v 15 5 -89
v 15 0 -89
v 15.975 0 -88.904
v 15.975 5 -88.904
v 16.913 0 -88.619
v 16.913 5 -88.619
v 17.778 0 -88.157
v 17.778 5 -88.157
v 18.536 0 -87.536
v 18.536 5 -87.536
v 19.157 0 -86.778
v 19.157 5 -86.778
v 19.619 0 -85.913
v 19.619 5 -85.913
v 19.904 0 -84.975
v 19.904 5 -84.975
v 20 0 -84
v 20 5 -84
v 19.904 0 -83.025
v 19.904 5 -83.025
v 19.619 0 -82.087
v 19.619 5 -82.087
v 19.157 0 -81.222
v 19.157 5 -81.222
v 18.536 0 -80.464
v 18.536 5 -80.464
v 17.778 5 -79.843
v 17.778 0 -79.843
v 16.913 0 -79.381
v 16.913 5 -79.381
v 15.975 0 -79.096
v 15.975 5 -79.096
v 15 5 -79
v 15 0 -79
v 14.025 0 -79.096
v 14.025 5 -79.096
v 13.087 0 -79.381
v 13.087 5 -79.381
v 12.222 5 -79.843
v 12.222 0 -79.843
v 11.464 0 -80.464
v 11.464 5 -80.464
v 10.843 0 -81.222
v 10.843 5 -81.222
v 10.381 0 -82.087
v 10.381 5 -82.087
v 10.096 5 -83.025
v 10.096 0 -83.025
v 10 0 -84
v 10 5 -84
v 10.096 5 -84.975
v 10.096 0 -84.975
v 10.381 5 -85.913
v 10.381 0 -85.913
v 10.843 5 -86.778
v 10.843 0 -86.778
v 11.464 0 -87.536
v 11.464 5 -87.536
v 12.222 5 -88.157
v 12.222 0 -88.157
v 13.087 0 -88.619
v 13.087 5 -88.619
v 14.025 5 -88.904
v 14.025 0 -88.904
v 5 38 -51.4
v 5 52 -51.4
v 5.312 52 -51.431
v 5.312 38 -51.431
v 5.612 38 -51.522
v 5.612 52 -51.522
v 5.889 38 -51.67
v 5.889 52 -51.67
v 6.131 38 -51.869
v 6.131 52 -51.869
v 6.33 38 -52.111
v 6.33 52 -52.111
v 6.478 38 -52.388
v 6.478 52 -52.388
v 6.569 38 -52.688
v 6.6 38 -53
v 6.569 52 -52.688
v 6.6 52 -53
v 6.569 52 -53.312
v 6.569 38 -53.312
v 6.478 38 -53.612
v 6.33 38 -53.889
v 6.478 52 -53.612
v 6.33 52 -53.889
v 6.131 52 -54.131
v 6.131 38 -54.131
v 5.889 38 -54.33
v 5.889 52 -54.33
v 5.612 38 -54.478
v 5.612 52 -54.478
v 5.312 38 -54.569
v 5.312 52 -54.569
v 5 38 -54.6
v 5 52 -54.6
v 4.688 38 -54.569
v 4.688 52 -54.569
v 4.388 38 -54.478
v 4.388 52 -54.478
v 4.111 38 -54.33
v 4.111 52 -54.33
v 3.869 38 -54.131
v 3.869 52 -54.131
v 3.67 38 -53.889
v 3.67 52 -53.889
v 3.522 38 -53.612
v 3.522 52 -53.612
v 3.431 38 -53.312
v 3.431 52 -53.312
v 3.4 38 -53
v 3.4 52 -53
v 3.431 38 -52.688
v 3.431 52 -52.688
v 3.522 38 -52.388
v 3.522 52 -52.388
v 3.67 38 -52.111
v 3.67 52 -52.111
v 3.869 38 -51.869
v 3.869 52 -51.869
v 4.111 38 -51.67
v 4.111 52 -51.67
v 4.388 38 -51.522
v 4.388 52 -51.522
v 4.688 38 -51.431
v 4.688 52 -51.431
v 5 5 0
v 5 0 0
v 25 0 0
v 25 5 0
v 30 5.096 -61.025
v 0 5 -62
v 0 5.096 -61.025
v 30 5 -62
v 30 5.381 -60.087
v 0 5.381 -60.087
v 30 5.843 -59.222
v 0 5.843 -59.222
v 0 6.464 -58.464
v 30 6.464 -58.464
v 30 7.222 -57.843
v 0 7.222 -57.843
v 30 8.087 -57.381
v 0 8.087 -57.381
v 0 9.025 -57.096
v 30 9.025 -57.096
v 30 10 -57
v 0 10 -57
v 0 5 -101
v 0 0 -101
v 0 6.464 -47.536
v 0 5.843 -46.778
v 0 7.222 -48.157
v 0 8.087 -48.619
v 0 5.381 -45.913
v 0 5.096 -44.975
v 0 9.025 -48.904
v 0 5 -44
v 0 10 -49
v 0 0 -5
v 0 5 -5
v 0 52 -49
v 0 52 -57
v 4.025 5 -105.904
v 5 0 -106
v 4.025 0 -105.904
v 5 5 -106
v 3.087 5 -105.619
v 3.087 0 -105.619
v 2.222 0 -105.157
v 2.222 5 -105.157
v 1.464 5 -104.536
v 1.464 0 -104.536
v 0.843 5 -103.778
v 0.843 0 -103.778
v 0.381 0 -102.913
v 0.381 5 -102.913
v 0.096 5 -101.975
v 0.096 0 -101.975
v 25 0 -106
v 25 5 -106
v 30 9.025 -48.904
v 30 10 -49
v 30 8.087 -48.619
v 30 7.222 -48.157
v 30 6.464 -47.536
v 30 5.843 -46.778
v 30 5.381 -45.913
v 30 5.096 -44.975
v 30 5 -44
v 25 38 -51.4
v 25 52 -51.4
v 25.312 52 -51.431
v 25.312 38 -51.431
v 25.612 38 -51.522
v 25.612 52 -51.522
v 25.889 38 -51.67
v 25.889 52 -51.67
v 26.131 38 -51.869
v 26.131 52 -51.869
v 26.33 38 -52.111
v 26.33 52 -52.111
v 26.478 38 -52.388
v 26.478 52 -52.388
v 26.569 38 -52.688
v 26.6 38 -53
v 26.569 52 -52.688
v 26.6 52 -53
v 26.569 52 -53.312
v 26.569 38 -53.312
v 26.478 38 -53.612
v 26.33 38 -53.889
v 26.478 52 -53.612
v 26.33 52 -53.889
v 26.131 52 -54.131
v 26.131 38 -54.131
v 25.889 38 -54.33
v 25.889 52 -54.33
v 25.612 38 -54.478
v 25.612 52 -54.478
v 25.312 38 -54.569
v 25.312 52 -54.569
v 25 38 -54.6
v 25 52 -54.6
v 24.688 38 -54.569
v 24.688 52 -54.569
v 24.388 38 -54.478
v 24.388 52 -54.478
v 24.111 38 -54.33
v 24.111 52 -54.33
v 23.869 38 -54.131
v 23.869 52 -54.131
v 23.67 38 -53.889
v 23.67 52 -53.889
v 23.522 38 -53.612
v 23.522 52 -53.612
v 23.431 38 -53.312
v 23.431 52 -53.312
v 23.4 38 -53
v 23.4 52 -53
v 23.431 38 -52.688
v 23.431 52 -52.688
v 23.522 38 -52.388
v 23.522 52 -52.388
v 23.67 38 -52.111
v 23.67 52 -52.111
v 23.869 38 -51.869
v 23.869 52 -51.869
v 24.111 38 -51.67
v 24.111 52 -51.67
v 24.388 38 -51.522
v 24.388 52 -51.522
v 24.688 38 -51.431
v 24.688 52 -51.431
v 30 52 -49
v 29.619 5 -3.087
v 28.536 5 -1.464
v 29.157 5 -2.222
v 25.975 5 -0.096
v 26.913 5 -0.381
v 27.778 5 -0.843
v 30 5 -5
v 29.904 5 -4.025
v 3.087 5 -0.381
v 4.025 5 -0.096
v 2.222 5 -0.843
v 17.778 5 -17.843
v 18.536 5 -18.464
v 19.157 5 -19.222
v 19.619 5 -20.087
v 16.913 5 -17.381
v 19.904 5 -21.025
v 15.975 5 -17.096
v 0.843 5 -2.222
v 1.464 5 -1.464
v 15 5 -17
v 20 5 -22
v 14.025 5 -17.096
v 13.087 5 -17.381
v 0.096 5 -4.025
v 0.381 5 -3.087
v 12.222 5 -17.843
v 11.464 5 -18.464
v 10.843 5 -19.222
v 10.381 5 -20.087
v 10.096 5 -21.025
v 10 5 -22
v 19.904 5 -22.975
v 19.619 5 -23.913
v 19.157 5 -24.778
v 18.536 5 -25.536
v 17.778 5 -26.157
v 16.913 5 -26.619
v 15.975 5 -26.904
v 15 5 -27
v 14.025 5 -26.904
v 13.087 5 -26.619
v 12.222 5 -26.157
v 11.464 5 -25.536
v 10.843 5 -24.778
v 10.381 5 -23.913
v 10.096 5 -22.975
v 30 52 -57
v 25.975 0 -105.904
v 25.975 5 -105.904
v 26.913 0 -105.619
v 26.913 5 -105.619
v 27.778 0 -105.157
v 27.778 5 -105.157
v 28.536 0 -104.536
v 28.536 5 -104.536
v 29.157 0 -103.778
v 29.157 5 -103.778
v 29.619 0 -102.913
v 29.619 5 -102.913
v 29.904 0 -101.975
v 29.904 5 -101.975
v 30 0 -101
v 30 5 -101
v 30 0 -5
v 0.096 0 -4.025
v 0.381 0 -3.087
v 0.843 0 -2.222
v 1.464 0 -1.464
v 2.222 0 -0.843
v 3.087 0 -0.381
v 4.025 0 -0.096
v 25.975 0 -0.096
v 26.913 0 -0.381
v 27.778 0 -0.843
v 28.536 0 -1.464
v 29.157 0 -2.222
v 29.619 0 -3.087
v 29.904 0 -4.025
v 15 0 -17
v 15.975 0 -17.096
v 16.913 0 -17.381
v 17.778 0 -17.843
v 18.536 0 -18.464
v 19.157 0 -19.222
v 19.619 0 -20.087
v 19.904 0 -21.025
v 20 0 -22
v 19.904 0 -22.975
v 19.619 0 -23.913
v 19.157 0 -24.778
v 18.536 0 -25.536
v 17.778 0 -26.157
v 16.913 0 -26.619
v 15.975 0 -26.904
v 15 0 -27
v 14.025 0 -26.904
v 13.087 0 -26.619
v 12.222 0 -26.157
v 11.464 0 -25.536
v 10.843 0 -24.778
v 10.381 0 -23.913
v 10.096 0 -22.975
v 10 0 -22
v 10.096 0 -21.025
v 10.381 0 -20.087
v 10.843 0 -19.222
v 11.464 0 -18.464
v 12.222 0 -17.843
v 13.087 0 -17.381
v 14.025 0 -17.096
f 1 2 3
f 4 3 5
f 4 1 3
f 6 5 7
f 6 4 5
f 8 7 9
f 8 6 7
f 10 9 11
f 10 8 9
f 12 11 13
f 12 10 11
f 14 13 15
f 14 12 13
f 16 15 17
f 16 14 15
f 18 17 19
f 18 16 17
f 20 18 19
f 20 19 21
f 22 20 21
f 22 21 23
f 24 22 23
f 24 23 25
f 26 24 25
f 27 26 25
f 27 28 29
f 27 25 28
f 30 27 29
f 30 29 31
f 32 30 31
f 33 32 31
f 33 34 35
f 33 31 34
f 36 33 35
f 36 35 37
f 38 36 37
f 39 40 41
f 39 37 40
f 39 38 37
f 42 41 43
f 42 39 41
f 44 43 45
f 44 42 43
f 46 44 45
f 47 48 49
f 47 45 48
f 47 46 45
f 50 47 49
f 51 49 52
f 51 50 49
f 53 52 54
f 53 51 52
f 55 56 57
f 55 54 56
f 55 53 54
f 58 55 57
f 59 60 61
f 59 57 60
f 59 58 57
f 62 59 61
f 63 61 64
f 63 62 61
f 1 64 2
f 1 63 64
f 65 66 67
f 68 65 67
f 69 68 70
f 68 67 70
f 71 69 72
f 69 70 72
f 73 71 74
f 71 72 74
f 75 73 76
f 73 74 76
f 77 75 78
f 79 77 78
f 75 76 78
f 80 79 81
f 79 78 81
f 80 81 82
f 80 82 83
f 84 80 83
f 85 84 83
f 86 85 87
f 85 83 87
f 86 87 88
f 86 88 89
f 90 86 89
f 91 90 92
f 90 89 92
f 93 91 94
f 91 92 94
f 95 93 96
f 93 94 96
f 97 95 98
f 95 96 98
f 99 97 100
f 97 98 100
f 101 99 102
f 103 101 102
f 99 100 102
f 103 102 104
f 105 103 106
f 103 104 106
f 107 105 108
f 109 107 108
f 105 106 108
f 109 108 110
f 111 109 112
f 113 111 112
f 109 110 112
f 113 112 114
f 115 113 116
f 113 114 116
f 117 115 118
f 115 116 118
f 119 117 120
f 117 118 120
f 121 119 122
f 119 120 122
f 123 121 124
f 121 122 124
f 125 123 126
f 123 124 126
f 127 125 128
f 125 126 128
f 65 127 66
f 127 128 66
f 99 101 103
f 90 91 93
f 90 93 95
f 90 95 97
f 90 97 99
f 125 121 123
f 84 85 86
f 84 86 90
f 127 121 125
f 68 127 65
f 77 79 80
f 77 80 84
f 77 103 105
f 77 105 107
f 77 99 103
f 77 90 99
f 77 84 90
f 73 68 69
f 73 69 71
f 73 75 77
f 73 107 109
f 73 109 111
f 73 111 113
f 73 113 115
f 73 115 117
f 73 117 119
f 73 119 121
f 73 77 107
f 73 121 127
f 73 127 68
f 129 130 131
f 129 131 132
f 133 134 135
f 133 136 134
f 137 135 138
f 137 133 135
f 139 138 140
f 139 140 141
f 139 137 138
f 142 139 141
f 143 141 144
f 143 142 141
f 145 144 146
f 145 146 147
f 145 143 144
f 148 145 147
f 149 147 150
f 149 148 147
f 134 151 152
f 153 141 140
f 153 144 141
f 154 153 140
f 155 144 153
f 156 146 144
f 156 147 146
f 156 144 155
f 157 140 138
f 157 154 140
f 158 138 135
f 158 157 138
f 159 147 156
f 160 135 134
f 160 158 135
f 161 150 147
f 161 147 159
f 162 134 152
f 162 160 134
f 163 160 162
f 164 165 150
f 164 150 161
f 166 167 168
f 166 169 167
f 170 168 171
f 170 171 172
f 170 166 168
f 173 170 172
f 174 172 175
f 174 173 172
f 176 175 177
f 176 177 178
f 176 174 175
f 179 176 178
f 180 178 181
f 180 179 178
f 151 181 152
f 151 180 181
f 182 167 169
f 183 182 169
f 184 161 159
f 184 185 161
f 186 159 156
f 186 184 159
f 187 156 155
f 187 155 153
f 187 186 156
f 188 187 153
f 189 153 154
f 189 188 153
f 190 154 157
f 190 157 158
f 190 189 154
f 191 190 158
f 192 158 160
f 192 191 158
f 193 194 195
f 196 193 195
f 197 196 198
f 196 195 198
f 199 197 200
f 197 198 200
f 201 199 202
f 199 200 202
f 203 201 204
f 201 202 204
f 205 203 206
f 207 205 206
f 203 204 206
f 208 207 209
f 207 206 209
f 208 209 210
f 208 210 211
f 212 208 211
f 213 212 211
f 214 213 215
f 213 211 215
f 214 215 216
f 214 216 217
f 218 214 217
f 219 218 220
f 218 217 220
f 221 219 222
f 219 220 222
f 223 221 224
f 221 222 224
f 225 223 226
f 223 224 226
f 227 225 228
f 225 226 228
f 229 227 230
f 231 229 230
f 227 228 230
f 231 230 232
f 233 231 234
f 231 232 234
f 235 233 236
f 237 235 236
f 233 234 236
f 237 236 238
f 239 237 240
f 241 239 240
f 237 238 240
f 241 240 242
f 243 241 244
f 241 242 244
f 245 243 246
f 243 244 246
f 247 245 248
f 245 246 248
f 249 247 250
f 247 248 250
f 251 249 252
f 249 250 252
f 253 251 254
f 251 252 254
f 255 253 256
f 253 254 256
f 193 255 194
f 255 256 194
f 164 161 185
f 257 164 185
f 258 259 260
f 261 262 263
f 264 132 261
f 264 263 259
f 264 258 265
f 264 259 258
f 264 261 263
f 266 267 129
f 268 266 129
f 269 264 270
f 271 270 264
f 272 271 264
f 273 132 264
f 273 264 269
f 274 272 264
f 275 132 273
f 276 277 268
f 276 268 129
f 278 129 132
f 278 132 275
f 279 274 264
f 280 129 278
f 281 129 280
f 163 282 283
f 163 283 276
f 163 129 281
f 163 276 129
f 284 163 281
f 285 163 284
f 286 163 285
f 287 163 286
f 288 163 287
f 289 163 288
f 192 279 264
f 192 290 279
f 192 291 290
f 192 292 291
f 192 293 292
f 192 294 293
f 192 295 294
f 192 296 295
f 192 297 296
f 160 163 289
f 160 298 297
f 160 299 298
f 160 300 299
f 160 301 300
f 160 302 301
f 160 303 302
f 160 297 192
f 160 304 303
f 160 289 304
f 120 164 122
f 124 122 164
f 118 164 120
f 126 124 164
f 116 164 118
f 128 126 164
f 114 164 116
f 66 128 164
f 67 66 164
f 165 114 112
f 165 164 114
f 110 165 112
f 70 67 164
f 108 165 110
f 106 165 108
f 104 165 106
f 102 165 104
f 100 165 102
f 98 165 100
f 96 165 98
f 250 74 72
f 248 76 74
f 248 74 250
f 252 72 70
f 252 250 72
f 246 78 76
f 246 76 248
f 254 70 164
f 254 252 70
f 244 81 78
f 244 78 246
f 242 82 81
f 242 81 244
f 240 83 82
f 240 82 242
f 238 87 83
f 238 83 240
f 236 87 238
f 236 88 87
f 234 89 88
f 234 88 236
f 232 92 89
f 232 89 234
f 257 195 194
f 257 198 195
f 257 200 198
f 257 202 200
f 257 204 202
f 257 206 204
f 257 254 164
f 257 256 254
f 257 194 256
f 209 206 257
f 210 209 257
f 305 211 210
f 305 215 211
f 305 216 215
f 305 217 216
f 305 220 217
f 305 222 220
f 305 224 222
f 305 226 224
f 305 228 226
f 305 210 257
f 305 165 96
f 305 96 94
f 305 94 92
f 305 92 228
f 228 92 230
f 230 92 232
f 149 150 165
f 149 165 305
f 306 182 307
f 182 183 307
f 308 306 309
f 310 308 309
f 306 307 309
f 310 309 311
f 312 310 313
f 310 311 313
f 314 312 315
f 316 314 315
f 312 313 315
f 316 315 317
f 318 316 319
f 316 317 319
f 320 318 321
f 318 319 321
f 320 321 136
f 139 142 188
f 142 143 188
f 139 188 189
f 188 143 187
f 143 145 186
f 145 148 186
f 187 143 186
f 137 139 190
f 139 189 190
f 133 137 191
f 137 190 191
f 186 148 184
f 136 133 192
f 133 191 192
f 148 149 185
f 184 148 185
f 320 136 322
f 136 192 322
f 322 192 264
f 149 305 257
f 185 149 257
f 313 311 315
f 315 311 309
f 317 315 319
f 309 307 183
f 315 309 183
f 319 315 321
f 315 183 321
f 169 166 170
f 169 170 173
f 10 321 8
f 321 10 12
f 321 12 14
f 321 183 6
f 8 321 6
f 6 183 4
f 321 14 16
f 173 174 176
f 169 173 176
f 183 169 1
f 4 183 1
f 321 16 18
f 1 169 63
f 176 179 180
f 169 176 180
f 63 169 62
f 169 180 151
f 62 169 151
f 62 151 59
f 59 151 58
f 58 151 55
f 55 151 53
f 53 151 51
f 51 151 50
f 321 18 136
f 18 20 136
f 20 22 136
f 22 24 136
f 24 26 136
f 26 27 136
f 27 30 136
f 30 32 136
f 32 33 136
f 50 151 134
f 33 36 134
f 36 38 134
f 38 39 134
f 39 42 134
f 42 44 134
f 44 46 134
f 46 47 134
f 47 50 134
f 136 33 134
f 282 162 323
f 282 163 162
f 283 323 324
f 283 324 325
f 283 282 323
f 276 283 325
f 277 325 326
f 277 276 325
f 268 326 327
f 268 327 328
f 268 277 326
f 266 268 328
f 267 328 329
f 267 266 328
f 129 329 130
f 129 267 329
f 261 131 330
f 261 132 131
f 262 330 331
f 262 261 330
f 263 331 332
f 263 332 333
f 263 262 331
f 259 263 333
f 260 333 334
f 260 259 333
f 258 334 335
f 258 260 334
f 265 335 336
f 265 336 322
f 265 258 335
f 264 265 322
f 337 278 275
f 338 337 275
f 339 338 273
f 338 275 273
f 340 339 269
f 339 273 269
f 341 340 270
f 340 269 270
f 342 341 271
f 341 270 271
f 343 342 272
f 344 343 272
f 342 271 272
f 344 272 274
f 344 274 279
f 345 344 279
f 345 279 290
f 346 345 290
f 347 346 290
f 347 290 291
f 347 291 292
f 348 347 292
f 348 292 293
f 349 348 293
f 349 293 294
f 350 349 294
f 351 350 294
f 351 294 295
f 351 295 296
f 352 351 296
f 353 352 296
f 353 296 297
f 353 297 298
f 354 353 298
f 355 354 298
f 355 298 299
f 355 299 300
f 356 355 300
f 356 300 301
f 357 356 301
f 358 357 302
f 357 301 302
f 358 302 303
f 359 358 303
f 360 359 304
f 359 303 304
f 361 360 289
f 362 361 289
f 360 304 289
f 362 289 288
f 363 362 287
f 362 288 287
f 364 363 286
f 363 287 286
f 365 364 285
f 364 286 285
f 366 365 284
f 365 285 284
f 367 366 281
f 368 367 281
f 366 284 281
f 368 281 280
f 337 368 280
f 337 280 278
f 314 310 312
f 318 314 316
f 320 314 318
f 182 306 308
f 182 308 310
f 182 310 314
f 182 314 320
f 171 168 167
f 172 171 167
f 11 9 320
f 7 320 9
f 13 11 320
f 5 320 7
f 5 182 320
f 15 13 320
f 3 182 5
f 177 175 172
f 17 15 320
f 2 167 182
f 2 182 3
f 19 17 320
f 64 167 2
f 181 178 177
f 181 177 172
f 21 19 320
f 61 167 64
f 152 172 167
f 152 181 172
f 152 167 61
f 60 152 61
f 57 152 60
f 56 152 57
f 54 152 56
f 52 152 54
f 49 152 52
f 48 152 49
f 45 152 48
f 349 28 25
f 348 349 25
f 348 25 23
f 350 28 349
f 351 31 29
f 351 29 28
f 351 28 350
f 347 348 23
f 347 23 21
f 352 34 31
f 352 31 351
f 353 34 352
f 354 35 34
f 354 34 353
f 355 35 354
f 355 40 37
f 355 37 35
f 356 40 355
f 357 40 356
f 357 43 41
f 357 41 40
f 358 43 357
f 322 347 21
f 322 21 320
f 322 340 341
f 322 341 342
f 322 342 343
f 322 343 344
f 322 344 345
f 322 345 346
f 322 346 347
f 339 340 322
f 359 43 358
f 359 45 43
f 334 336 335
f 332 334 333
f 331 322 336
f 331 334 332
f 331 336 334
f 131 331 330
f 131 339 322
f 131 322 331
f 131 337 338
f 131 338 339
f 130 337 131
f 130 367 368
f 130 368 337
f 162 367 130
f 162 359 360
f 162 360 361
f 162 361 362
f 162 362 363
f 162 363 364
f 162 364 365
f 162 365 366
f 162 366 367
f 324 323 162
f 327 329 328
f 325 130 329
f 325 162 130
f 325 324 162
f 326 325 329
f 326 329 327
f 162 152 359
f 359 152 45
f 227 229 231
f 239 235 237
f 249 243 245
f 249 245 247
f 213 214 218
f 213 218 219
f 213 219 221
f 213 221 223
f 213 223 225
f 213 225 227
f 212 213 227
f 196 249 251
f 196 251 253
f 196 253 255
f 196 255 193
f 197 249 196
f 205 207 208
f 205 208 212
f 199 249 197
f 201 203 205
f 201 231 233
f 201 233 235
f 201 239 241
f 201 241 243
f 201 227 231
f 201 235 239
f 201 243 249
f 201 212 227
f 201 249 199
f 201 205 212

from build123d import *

# Parameters (mm, degrees)
SKETCH1_W           = 57
SKETCH1_H           = 5
BOSS_EXTRUDE1_DEPTH = 30
SKETCH2_W           = 30
SKETCH2_H           = 8
BOSS_EXTRUDE2_DEPTH = 47
SKETCH3_R           = 5
CUT_EXTRUDE1_DEPTH  = 80.737067917
SKETCH5_R           = 1.6
CUT_EXTRUDE3_DEPTH  = 14
FILLET1_R           = 5
FILLET2_R           = 5


with BuildPart() as part:
    # Sketch1 → Boss-Extrude1 (new body)
    with BuildSketch(Plane(origin=(0, 0, 0), x_dir=(0, 0, -1), z_dir=(1, 0, 0))):
        with Locations((28.5, 2.5)):
            Rectangle(SKETCH1_W, SKETCH1_H)
    boss_extrude1 = extrude(amount=BOSS_EXTRUDE1_DEPTH)

    # Sketch2 → Boss-Extrude2 (add)
    with BuildSketch(Plane(origin=(0, 5, 0), x_dir=(1, 0, 0), z_dir=(0, 1, 0))):
        with Locations((15, 53)):
            Rectangle(SKETCH2_W, SKETCH2_H)
    extrude(amount=BOSS_EXTRUDE2_DEPTH)

    # Sketch3 → Cut-Extrude1 (cut, through all)
    with BuildSketch(Plane(origin=(0, 5, 0), x_dir=(1, 0, 0), z_dir=(0, 1, 0))):
        with Locations(Location((15, 22, 0), (0, 0, 270))):
            Circle(SKETCH3_R)
    cut_extrude1 = extrude(amount=-CUT_EXTRUDE1_DEPTH, mode=Mode.SUBTRACT)

    # Sketch5 → Cut-Extrude3 (cut)
    with BuildSketch(Plane(origin=(0, 52, 0), x_dir=(1, 0, 0), z_dir=(0, 1, 0))):
        with Locations(Location((5, 53, 0), (0, 0, 270))):
            Circle(SKETCH5_R)
        with Locations(Location((25, 53, 0), (0, 0, 270))):
            Circle(SKETCH5_R)
    extrude(amount=-CUT_EXTRUDE3_DEPTH, mode=Mode.SUBTRACT)

    # Fillet1
    fillet1_edges = [part.edges().sort_by_distance(p)[0] for p in [
        (15, 5, -49),
        (30, 2.5, 0),
        (0, 2.5, 0),
        (15, 0, -57),
    ]]
    fillet(fillet1_edges, radius=FILLET1_R)

    # Mirror1: Boss-Extrude1, Cut-Extrude1 across plane
    add(boss_extrude1.mirror(Plane(origin=(0, 0, -53), x_dir=(1, 0, 0), z_dir=(0, 0, -1))))
    add(cut_extrude1.mirror(Plane(origin=(0, 0, -53), x_dir=(1, 0, 0), z_dir=(0, 0, -1))), mode=Mode.SUBTRACT)

    # Fillet2
    fillet2_edges = [part.edges().sort_by_distance(p)[0] for p in [
        (15, 5, -57),
        (0, 2.5, -106),
        (30, 2.5, -106),
    ]]
    fillet(fillet2_edges, radius=FILLET2_R)


solid = part.part
